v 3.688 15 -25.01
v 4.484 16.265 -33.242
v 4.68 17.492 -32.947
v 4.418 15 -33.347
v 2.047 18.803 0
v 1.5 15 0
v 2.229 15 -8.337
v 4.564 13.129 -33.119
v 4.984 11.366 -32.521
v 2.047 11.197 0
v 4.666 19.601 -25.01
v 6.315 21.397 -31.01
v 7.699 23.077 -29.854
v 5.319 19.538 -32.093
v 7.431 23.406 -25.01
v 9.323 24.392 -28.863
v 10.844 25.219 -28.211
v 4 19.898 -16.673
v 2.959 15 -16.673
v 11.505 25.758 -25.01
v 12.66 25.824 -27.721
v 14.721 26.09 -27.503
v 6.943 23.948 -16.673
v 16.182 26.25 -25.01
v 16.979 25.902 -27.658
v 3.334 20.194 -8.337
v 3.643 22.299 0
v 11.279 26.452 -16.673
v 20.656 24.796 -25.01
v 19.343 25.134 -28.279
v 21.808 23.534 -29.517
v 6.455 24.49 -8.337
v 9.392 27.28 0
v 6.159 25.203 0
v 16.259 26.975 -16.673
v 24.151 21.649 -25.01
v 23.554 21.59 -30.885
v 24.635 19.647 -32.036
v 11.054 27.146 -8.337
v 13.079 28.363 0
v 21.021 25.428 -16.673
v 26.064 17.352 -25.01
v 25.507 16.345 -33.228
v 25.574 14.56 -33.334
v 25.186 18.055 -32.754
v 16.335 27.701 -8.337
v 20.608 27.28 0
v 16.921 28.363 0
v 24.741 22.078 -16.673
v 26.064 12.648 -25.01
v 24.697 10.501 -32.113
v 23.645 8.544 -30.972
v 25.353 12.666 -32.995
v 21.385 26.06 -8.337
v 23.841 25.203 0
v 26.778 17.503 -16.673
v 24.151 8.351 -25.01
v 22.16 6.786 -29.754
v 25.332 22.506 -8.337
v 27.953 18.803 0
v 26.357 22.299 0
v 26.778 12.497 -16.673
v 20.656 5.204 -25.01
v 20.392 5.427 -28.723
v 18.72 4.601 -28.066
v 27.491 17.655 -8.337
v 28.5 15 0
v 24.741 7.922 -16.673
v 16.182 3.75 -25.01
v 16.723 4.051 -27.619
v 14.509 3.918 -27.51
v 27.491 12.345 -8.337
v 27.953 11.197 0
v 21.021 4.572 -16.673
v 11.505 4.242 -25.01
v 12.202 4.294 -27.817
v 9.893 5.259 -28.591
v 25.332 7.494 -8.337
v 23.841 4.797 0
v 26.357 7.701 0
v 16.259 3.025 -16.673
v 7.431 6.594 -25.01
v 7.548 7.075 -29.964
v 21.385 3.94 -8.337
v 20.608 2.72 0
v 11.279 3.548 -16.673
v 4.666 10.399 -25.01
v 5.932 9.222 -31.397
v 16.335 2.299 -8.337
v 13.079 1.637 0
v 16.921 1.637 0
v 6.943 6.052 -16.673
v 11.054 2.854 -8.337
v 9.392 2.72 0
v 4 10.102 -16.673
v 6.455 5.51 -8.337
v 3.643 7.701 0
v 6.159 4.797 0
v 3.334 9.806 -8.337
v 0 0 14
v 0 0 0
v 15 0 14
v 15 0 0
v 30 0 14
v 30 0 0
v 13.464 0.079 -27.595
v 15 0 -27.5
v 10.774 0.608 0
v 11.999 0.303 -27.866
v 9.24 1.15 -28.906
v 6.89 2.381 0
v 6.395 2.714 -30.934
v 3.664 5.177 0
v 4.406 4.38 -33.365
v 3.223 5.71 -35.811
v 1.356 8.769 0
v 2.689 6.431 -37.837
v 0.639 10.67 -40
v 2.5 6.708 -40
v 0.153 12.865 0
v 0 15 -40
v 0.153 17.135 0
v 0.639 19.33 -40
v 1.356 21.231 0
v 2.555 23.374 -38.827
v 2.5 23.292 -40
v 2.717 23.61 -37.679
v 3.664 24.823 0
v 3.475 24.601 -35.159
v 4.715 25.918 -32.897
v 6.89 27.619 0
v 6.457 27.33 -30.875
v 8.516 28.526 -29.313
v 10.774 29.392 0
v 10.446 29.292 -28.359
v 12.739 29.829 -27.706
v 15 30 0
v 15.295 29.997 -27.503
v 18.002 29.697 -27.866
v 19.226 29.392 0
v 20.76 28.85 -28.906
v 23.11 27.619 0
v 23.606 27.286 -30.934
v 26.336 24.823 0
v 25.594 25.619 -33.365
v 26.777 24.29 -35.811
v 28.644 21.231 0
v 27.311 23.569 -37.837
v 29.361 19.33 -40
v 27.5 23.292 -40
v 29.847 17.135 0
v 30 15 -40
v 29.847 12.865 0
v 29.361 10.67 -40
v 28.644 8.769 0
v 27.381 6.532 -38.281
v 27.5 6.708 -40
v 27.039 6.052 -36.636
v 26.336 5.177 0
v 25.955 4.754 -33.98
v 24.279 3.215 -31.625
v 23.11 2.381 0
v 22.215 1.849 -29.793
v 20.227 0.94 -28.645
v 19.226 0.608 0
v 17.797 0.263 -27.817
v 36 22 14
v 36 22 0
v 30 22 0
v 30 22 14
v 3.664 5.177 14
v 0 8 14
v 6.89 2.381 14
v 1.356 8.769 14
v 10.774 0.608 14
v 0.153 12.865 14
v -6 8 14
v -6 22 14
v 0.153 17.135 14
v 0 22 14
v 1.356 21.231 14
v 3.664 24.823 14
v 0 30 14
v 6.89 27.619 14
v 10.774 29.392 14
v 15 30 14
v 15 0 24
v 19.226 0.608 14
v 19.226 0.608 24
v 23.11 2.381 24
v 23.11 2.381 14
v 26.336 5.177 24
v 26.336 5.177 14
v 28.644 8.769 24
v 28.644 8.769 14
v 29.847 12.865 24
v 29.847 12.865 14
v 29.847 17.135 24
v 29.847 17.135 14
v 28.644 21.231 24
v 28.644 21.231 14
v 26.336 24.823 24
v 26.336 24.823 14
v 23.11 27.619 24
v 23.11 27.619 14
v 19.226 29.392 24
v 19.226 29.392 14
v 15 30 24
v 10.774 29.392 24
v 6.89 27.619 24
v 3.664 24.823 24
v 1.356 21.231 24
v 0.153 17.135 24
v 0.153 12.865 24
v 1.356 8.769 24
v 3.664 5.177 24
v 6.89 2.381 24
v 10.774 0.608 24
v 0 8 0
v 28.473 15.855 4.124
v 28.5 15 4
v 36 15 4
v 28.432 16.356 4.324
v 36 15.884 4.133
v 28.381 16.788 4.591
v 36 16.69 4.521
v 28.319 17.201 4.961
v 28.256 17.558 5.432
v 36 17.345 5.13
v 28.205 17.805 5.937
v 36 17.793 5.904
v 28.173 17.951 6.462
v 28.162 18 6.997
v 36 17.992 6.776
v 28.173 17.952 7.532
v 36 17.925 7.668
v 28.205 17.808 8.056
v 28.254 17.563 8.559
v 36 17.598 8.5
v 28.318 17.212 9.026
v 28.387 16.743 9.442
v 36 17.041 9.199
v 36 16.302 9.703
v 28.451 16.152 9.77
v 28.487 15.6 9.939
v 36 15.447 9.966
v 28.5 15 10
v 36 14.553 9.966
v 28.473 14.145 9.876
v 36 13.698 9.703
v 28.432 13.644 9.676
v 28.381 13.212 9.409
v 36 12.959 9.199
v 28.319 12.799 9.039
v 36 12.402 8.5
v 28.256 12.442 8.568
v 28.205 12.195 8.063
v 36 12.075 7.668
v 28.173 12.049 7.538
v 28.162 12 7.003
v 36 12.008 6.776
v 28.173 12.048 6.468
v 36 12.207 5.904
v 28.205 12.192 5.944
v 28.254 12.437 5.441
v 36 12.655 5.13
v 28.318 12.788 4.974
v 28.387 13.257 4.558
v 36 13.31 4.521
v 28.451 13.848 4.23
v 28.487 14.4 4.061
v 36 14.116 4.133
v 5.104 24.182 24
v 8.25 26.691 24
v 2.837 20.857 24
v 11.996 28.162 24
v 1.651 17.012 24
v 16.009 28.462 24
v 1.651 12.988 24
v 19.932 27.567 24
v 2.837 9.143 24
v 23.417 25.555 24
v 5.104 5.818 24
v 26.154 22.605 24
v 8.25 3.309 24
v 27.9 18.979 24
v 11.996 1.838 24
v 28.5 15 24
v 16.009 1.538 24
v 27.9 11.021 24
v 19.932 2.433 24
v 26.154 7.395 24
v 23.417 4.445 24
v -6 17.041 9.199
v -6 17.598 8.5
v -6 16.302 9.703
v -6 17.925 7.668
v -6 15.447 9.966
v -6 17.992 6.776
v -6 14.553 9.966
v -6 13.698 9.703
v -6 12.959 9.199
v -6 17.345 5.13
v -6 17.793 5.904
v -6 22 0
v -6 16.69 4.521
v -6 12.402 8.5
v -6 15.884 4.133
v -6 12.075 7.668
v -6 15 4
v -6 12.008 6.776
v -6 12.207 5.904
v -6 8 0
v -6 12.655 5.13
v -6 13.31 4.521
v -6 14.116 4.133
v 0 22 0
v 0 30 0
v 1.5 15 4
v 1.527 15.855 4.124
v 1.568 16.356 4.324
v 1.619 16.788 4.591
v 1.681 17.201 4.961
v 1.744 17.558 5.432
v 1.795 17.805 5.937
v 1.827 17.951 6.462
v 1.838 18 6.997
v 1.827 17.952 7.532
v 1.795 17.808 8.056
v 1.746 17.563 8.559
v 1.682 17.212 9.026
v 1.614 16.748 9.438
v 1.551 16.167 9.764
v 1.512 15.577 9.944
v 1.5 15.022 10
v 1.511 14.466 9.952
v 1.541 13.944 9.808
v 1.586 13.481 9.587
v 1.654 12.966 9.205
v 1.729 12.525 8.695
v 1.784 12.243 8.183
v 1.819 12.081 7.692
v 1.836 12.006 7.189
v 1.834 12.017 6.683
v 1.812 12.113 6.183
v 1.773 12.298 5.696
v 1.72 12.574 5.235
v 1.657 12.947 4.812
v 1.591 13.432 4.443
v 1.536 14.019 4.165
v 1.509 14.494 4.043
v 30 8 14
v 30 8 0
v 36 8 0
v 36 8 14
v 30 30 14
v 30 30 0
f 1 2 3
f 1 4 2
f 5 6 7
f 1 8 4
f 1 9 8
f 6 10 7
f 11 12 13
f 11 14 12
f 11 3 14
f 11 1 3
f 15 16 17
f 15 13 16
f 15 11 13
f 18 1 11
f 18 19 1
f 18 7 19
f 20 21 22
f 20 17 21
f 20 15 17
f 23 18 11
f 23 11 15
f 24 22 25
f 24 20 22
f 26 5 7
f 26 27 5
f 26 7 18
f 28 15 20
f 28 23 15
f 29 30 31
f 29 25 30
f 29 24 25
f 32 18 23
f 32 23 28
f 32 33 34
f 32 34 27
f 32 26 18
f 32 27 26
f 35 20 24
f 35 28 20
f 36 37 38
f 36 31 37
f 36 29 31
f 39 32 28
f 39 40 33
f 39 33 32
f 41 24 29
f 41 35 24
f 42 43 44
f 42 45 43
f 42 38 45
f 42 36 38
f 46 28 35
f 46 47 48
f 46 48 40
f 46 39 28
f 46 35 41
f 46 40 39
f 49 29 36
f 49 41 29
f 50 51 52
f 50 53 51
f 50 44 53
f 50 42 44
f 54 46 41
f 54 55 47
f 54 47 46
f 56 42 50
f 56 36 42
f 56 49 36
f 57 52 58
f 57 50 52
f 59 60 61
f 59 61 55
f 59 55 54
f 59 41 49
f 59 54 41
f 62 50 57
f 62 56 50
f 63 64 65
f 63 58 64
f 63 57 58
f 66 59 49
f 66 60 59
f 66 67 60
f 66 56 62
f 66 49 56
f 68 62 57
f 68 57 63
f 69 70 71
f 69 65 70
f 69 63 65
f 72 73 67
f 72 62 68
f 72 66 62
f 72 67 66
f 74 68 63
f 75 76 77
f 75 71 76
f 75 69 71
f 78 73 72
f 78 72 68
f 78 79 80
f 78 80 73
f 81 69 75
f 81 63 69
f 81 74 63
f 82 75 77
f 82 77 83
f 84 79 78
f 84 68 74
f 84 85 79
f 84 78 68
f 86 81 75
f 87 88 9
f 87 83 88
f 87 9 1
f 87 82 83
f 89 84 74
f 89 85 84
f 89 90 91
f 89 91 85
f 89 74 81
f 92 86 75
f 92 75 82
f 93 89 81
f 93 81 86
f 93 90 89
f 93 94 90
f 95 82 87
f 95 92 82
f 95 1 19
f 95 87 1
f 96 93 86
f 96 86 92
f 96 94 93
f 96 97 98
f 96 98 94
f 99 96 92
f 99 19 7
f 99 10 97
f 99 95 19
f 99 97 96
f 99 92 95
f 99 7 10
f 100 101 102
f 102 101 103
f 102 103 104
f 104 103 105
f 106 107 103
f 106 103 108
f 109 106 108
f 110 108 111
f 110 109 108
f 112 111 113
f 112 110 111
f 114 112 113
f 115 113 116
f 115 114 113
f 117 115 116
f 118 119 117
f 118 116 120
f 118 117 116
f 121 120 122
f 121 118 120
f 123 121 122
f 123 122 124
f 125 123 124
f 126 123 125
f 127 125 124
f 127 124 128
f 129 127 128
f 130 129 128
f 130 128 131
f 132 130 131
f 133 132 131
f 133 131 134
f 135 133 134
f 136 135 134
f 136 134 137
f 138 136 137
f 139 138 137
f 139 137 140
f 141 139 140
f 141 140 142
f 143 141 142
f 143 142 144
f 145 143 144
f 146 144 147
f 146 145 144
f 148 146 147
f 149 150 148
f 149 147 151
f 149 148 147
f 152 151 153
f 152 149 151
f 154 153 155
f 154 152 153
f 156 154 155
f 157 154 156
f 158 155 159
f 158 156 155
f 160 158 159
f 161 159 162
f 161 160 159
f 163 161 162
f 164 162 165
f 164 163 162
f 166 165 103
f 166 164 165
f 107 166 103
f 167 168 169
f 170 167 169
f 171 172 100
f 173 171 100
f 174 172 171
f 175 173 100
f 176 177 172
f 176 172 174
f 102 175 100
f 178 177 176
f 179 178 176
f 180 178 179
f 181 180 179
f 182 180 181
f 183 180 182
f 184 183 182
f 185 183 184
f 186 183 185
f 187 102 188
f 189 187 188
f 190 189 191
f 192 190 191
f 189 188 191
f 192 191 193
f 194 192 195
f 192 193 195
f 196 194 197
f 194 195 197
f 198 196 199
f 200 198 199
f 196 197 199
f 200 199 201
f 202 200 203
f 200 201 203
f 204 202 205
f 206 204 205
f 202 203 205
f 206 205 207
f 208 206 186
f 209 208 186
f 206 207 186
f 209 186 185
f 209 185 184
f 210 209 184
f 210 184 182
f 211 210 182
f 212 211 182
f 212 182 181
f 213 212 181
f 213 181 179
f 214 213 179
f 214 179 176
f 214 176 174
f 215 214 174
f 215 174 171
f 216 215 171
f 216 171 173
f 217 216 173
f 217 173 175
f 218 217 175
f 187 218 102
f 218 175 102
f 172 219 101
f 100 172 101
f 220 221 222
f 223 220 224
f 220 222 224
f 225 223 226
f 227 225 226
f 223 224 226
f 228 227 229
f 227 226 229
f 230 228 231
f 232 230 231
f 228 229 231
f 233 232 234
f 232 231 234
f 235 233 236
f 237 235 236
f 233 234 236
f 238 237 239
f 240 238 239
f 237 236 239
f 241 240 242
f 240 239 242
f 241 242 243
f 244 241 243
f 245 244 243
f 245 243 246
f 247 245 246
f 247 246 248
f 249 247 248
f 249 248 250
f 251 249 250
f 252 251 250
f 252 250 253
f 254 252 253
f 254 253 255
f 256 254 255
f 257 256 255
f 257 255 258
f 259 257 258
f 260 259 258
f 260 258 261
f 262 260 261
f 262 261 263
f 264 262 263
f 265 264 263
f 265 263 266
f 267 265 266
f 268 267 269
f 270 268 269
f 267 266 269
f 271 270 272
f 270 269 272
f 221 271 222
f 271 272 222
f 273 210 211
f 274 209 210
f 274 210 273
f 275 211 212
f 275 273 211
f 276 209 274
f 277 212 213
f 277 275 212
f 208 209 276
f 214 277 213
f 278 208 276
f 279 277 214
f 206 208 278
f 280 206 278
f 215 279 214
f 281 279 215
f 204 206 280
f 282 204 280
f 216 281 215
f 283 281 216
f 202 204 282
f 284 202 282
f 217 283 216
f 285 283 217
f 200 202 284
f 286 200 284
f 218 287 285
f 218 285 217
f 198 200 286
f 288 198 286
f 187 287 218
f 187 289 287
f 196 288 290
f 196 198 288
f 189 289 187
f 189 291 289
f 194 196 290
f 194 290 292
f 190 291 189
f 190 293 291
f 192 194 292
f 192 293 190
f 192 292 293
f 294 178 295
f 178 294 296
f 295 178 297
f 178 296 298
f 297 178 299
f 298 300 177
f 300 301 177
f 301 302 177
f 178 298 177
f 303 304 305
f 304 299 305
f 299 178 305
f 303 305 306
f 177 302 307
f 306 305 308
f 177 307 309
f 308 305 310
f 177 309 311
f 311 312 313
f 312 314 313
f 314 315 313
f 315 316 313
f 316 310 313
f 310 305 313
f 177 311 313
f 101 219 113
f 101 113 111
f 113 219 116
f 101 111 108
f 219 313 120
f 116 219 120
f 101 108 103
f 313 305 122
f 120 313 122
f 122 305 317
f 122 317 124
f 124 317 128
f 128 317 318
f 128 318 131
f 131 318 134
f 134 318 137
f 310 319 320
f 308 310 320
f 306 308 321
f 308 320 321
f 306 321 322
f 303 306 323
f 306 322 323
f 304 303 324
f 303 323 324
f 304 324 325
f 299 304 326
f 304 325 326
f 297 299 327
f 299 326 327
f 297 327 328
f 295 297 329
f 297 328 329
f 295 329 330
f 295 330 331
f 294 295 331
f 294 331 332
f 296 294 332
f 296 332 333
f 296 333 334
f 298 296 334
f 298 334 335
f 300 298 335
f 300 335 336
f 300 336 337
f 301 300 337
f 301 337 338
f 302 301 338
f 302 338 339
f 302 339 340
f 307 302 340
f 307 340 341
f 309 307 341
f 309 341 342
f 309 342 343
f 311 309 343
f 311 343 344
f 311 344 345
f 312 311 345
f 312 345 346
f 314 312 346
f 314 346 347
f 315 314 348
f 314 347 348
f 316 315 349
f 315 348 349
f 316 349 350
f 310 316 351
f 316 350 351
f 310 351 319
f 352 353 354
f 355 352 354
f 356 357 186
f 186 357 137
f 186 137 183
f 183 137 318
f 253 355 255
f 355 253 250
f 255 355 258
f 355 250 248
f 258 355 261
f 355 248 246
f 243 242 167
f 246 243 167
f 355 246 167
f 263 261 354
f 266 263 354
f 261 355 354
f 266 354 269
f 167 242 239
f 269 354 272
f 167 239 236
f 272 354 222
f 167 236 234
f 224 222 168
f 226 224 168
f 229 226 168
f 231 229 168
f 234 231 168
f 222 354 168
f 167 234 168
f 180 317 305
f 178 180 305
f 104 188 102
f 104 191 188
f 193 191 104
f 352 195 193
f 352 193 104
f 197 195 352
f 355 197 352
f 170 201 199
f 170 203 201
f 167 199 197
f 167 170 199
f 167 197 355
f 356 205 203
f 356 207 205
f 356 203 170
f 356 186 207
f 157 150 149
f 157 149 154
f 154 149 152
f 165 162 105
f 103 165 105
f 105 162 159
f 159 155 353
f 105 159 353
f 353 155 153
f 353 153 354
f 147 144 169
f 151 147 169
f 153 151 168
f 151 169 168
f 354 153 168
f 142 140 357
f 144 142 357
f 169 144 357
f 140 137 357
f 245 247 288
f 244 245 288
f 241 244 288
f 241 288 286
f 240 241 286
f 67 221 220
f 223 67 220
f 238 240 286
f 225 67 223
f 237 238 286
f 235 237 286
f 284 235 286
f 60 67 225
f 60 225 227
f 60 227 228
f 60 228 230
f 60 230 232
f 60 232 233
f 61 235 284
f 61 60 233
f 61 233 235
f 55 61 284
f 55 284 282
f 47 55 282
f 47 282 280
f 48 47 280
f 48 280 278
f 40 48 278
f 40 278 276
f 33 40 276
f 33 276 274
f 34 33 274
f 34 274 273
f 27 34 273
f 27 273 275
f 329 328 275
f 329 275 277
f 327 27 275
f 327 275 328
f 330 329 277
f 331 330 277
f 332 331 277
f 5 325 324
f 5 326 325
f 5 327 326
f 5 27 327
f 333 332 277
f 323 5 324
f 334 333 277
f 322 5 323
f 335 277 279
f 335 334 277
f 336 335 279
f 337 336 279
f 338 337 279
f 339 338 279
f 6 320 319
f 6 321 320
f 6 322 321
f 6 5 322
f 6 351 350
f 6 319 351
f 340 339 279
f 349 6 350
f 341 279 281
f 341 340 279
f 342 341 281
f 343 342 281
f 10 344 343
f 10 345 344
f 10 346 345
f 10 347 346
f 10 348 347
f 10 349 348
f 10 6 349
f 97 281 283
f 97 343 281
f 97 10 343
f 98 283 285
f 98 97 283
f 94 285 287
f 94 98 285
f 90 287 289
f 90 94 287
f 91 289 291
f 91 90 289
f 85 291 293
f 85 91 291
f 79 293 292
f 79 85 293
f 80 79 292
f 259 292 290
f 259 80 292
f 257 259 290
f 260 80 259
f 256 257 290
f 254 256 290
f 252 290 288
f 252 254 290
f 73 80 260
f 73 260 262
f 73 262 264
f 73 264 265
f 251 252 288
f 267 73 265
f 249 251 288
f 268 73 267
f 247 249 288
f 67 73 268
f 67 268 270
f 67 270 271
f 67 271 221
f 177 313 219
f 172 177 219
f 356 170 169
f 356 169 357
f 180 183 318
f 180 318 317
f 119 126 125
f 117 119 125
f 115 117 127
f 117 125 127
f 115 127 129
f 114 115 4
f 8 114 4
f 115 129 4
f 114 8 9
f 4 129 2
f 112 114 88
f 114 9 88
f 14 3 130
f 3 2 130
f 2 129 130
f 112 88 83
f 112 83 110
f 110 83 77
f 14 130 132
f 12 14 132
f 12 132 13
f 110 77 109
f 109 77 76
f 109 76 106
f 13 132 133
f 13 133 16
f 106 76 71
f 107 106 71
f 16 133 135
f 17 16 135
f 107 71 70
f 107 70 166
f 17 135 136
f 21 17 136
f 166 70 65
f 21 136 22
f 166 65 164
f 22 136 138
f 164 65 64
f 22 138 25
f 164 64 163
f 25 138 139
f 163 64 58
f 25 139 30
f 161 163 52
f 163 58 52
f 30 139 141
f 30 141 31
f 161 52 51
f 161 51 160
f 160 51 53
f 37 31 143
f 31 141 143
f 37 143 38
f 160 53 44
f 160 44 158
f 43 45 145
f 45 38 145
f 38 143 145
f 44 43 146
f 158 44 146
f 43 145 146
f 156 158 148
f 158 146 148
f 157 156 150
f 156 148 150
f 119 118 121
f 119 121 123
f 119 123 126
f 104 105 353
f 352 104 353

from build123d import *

# Parameters (mm, degrees)
SKETCH_1_R          = 13.5
EXTRUDE_1_DEPTH     = 14
SKETCH_2_R          = 15
SKETCH_2_R_2        = 13.5
EXTRUDE_2_DEPTH     = 10
EXTRUDE_START       = 40
SKETCH_3_R          = 15
EXTRUDE_3_DEPTH     = 40
SKETCH_4_R          = 10
CUT_EXTRUDE_1_DEPTH = 40
SKETCH_6_R          = 3
CUT_EXTRUDE_2_DEPTH = 66.299310931
SKETCH_7_R          = 12.5
CUT_EXTRUDE_3_DEPTH = 62.611687326


with BuildPart() as part:
    # Эскиз1 → Бобышка-Вытянуть1 (new body)
    with BuildSketch(Plane.XY):
        Polygon((0, 30), (0, 22), (-6, 22), (-6, 8), (0, 8), (0, 0), (30, 0), (30, 8), (36, 8), (36, 22), (30, 22), (30, 30), align=None)
        with Locations((15, 15)):
            Circle(SKETCH_1_R, mode=Mode.SUBTRACT)
    extrude(amount=EXTRUDE_1_DEPTH)

    # Эскиз2 → Бобышка-Вытянуть2 (add)
    with BuildSketch(Plane.XY.offset(14)):
        with Locations(Location((15, 15, 0), (0, 0, 270))):
            Circle(SKETCH_2_R)
        with Locations((15, 15)):
            Circle(SKETCH_2_R_2, mode=Mode.SUBTRACT)
    extrude(amount=EXTRUDE_2_DEPTH)

    # Эскиз3 → Бобышка-Вытянуть3 (add)
    with BuildSketch(Plane(origin=(0, 0, 0), x_dir=(-1, 0, 0), z_dir=(0, 0, -1)).offset(EXTRUDE_START)):
        with Locations(Location((-15, 15, 0), (0, 0, 270))):
            Circle(SKETCH_3_R)
    extrude(amount=-EXTRUDE_3_DEPTH)

    # Эскиз4 → Вырез-Вытянуть1 (cut)
    with BuildSketch(Plane(origin=(0, 0, -40), x_dir=(-1, 0, 0), z_dir=(0, 0, -1))):
        with Locations((-15, 15)):
            Circle(SKETCH_4_R)
    extrude(amount=-CUT_EXTRUDE_1_DEPTH, mode=Mode.SUBTRACT)

    # loft up to a face of the part (loft_1)
    loft([Face(Wire([part.edges().sort_by_distance((21.845471059, 22.289686274, -40))[0]])), Face(Wire([part.edges().sort_by_distance((5.75861407, 24.84107647, 0))[0]]))], mode=Mode.SUBTRACT)

    # Эскиз6 → Вырез-Вытянуть2 (cut, through all)
    with BuildSketch(Plane(origin=(36, 0, 0), x_dir=(0, 0, -1), z_dir=(1, 0, 0))):
        with Locations((-7, 15)):
            Circle(SKETCH_6_R)
    extrude(amount=-CUT_EXTRUDE_2_DEPTH, mode=Mode.SUBTRACT)

    # Эскиз7 → Вырез-Вытянуть3 (cut, through all)
    with BuildSketch(Plane(origin=(0, 30, 0), x_dir=(1, 0, 0), z_dir=(0, 1, 0))):
        with Locations((15, 40)):
            Circle(SKETCH_7_R)
    extrude(amount=-CUT_EXTRUDE_3_DEPTH, mode=Mode.SUBTRACT)


solid = part.part
